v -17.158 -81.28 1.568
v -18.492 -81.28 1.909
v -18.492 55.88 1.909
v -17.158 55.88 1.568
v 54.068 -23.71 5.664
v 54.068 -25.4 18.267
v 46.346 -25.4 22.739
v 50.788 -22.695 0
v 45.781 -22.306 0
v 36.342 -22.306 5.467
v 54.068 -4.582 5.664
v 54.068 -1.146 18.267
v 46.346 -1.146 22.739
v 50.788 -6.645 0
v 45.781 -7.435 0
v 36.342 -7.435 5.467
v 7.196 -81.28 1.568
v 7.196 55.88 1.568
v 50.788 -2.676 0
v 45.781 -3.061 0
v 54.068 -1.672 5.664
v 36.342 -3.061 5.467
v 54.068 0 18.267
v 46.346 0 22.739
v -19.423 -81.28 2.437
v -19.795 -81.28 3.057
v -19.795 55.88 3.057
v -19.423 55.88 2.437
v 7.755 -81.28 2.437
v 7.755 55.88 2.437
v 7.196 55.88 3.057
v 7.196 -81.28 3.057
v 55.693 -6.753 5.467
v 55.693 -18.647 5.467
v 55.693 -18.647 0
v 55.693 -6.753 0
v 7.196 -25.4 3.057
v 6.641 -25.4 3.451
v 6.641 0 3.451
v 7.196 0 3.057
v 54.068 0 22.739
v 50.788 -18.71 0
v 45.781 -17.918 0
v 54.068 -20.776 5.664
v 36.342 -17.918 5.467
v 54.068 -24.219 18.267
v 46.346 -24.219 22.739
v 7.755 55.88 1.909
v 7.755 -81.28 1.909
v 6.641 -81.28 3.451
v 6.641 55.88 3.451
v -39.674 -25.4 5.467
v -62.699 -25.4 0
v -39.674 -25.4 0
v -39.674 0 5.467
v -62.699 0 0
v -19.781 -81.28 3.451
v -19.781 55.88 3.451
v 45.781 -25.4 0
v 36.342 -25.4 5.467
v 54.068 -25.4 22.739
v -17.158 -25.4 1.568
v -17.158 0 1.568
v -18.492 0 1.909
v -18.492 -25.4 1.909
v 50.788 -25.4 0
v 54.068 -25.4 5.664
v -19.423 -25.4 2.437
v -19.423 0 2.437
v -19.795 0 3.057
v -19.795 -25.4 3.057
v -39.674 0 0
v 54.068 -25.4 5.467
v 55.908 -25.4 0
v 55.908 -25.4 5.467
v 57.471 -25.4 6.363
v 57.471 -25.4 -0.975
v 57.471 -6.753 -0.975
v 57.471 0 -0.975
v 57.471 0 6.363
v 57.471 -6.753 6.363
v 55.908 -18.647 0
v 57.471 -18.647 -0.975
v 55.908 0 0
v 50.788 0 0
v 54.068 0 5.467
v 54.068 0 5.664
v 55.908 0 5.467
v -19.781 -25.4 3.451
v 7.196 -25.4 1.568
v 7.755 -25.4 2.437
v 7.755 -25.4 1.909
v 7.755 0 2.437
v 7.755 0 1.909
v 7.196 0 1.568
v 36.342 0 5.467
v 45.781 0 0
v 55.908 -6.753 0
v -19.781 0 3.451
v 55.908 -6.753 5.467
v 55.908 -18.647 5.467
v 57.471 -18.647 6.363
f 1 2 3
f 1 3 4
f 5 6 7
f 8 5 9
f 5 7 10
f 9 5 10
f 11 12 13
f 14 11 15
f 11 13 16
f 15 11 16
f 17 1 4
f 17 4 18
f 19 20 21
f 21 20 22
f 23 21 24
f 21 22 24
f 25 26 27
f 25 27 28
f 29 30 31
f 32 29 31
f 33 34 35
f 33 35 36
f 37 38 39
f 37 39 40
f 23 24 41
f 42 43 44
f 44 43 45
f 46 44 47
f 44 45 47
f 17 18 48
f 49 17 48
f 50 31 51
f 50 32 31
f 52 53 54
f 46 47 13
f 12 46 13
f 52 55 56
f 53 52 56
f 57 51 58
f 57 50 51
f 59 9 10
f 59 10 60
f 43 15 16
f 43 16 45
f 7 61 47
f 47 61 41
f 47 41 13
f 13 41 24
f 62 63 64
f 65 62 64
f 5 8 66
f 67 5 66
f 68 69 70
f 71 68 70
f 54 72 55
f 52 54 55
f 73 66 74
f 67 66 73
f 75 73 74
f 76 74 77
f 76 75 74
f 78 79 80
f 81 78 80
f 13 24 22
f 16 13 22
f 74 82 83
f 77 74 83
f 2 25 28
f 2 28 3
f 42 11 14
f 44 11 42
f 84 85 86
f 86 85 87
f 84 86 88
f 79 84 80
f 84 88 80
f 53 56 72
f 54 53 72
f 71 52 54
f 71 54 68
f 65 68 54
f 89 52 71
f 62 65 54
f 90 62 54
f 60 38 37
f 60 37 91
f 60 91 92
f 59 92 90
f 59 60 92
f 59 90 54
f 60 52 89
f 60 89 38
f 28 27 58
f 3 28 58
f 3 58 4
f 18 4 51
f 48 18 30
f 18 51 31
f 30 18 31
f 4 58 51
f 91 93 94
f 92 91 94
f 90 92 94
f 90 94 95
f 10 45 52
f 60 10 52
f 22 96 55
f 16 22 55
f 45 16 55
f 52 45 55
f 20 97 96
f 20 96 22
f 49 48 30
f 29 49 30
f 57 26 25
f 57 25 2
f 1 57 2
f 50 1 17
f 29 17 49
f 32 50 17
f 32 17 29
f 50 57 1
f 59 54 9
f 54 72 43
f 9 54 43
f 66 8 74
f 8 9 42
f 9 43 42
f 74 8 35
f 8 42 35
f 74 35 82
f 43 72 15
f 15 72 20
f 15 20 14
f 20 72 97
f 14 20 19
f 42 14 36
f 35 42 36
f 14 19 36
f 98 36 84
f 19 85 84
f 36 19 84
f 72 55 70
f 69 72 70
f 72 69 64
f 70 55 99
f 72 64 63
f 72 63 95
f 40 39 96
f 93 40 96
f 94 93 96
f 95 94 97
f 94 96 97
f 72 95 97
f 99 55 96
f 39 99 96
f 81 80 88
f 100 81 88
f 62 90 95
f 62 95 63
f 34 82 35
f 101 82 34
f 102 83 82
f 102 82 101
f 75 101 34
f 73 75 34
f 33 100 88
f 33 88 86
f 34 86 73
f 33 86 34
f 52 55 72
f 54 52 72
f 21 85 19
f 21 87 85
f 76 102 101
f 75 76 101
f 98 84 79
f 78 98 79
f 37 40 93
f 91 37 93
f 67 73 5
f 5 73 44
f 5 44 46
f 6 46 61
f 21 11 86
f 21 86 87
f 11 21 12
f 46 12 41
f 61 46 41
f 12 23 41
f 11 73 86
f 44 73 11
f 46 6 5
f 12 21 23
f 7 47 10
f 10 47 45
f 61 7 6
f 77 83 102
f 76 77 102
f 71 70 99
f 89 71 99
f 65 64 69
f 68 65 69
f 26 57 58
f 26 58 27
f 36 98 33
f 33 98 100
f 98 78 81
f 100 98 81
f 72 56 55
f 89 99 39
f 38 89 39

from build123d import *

# Parameters (mm, degrees)
F1_DEPTH  = 25.4
F2_DEPTH  = 81.28
F3_DEPTH  = 25.4
F4_DEPTH  = 25.4
F5_DEPTH  = 25.4
F6_DEPTH  = 55.88
F8_DEPTH  = 15.24
F9_DEPTH  = 15.24
F10_W     = 11.8936536178
F10_H     = 7.3380545364
F11_DEPTH = 1.778
F12_DEPTH = 15.24


with BuildPart() as f1:
    # F0 (on Front) → F1 (new body)
    with BuildSketch(Plane.XZ):
        Polygon((-39.6736972034, 5.4665217176), (-62.6993477345, 0), (-39.6736972034, 0), align=None)
    extrude(amount=F1_DEPTH)


with BuildPart() as f2:
    # F0 (on Front) → F2 (new body)
    with BuildSketch(Plane.XZ):
        Polygon((6.640501786, 3.4507671371), (-19.7810214013, 3.4507671371), (-19.7953563184, 3.0573515687), (-19.4230601192, 2.4368572049), (-18.4923186898, 1.909436658), (-17.1582568437, 1.5681646764), (6.640501786, 1.5681646764), (7.1961563081, 1.5681646764), (7.7546015382, 1.909436658), (7.7546015382, 2.4368572049), (7.1961563081, 3.0573515687), align=None)
    extrude(amount=F2_DEPTH)

    # F0 (on Front) → F6 (join)
    with BuildSketch(Plane.XZ):
        Polygon((6.640501786, 3.4507671371), (-19.7810214013, 3.4507671371), (-19.7953563184, 3.0573515687), (-19.4230601192, 2.4368572049), (-18.4923186898, 1.909436658), (-17.1582568437, 1.5681646764), (6.640501786, 1.5681646764), (7.1961563081, 1.5681646764), (7.7546015382, 1.909436658), (7.7546015382, 2.4368572049), (7.1961563081, 3.0573515687), align=None)
    extrude(amount=-F6_DEPTH)


with BuildPart() as f3:
    # F0 (on Front) → F3 (new body)
    with BuildSketch(Plane.XZ):
        Polygon((36.3422520459, 5.4665217176), (-39.6736972034, 5.4665217176), (-39.6736972034, 0), (55.9076108038, 0), (55.9076108038, 5.4665217176), (54.0679916739, 5.4665217176), align=None)
        Polygon((-19.7953563184, 3.0573515687), (-19.7810214013, 3.4507671371), (6.640501786, 3.4507671371), (7.1961563081, 3.0573515687), (7.7546015382, 2.4368572049), (7.7546015382, 1.909436658), (7.1961563081, 1.5681646764), (6.640501786, 1.5681646764), (-17.1582568437, 1.5681646764), (-18.4923186898, 1.909436658), (-19.4230601192, 2.4368572049), align=None, mode=Mode.SUBTRACT)
    extrude(amount=F3_DEPTH)

    # F0 (on Front) → F4 (join)
    with BuildSketch(Plane.XZ):
        Polygon((46.3458821177, 22.739475593), (36.3422520459, 5.4665217176), (54.0679916739, 5.4665217176), (54.0679916739, 22.739475593), align=None)
    extrude(amount=F4_DEPTH)

    # F0 (on Front) → F5 (join)
    with BuildSketch(Plane.XZ):
        Polygon((55.9076108038, 5.4665217176), (55.9076108038, 0), (57.4713647366, -0.9749676683), (57.4713647366, 6.3630868681), align=None)
    extrude(amount=F5_DEPTH)

    # F7 (on face) → F8 (cut)
    with BuildSketch(Plane(origin=(24.8434570503, 0, -14.388086475), x_dir=(0, -1, 0), z_dir=(-0.8653502685, 0, 0.5011675496))):
        Polygon((3.0607865192, 22.9440134421), (0, 42.9046634865), (0, 22.9440134421), align=None)
    extrude(amount=-F8_DEPTH, mode=Mode.SUBTRACT)

    # F7 (on face) → F9 (cut)
    with BuildSketch(Plane(origin=(24.8434570503, 0, -14.388086475), x_dir=(0, -1, 0), z_dir=(-0.8653502685, 0, 0.5011675496))):
        Polygon((25.4, 22.9440134421), (25.4, 42.9046634865), (22.3062392324, 22.9440134421), align=None)
    extrude(amount=-F9_DEPTH, mode=Mode.SUBTRACT)

    # F10 (on face) → F11 (cut)
    with BuildSketch(Plane.YZ.offset(57.4713647366)):
        with Locations((-12.7, 2.6940595999)):
            Rectangle(F10_W, F10_H)
    extrude(amount=-F11_DEPTH, mode=Mode.SUBTRACT)

    # F7 (on face) → F12 (cut)
    with BuildSketch(Plane(origin=(24.8434570503, 0, -14.388086475), x_dir=(0, -1, 0), z_dir=(-0.8653502685, 0, 0.5011675496))):
        Polygon((24.219032377, 42.9046634865), (1.1461006943, 42.9046634865), (7.4352263473, 22.9440134421), (17.9180707783, 22.9440134421), align=None)
    extrude(amount=-F12_DEPTH, mode=Mode.SUBTRACT)


solid = Compound([f1.part, f2.part, f3.part])
